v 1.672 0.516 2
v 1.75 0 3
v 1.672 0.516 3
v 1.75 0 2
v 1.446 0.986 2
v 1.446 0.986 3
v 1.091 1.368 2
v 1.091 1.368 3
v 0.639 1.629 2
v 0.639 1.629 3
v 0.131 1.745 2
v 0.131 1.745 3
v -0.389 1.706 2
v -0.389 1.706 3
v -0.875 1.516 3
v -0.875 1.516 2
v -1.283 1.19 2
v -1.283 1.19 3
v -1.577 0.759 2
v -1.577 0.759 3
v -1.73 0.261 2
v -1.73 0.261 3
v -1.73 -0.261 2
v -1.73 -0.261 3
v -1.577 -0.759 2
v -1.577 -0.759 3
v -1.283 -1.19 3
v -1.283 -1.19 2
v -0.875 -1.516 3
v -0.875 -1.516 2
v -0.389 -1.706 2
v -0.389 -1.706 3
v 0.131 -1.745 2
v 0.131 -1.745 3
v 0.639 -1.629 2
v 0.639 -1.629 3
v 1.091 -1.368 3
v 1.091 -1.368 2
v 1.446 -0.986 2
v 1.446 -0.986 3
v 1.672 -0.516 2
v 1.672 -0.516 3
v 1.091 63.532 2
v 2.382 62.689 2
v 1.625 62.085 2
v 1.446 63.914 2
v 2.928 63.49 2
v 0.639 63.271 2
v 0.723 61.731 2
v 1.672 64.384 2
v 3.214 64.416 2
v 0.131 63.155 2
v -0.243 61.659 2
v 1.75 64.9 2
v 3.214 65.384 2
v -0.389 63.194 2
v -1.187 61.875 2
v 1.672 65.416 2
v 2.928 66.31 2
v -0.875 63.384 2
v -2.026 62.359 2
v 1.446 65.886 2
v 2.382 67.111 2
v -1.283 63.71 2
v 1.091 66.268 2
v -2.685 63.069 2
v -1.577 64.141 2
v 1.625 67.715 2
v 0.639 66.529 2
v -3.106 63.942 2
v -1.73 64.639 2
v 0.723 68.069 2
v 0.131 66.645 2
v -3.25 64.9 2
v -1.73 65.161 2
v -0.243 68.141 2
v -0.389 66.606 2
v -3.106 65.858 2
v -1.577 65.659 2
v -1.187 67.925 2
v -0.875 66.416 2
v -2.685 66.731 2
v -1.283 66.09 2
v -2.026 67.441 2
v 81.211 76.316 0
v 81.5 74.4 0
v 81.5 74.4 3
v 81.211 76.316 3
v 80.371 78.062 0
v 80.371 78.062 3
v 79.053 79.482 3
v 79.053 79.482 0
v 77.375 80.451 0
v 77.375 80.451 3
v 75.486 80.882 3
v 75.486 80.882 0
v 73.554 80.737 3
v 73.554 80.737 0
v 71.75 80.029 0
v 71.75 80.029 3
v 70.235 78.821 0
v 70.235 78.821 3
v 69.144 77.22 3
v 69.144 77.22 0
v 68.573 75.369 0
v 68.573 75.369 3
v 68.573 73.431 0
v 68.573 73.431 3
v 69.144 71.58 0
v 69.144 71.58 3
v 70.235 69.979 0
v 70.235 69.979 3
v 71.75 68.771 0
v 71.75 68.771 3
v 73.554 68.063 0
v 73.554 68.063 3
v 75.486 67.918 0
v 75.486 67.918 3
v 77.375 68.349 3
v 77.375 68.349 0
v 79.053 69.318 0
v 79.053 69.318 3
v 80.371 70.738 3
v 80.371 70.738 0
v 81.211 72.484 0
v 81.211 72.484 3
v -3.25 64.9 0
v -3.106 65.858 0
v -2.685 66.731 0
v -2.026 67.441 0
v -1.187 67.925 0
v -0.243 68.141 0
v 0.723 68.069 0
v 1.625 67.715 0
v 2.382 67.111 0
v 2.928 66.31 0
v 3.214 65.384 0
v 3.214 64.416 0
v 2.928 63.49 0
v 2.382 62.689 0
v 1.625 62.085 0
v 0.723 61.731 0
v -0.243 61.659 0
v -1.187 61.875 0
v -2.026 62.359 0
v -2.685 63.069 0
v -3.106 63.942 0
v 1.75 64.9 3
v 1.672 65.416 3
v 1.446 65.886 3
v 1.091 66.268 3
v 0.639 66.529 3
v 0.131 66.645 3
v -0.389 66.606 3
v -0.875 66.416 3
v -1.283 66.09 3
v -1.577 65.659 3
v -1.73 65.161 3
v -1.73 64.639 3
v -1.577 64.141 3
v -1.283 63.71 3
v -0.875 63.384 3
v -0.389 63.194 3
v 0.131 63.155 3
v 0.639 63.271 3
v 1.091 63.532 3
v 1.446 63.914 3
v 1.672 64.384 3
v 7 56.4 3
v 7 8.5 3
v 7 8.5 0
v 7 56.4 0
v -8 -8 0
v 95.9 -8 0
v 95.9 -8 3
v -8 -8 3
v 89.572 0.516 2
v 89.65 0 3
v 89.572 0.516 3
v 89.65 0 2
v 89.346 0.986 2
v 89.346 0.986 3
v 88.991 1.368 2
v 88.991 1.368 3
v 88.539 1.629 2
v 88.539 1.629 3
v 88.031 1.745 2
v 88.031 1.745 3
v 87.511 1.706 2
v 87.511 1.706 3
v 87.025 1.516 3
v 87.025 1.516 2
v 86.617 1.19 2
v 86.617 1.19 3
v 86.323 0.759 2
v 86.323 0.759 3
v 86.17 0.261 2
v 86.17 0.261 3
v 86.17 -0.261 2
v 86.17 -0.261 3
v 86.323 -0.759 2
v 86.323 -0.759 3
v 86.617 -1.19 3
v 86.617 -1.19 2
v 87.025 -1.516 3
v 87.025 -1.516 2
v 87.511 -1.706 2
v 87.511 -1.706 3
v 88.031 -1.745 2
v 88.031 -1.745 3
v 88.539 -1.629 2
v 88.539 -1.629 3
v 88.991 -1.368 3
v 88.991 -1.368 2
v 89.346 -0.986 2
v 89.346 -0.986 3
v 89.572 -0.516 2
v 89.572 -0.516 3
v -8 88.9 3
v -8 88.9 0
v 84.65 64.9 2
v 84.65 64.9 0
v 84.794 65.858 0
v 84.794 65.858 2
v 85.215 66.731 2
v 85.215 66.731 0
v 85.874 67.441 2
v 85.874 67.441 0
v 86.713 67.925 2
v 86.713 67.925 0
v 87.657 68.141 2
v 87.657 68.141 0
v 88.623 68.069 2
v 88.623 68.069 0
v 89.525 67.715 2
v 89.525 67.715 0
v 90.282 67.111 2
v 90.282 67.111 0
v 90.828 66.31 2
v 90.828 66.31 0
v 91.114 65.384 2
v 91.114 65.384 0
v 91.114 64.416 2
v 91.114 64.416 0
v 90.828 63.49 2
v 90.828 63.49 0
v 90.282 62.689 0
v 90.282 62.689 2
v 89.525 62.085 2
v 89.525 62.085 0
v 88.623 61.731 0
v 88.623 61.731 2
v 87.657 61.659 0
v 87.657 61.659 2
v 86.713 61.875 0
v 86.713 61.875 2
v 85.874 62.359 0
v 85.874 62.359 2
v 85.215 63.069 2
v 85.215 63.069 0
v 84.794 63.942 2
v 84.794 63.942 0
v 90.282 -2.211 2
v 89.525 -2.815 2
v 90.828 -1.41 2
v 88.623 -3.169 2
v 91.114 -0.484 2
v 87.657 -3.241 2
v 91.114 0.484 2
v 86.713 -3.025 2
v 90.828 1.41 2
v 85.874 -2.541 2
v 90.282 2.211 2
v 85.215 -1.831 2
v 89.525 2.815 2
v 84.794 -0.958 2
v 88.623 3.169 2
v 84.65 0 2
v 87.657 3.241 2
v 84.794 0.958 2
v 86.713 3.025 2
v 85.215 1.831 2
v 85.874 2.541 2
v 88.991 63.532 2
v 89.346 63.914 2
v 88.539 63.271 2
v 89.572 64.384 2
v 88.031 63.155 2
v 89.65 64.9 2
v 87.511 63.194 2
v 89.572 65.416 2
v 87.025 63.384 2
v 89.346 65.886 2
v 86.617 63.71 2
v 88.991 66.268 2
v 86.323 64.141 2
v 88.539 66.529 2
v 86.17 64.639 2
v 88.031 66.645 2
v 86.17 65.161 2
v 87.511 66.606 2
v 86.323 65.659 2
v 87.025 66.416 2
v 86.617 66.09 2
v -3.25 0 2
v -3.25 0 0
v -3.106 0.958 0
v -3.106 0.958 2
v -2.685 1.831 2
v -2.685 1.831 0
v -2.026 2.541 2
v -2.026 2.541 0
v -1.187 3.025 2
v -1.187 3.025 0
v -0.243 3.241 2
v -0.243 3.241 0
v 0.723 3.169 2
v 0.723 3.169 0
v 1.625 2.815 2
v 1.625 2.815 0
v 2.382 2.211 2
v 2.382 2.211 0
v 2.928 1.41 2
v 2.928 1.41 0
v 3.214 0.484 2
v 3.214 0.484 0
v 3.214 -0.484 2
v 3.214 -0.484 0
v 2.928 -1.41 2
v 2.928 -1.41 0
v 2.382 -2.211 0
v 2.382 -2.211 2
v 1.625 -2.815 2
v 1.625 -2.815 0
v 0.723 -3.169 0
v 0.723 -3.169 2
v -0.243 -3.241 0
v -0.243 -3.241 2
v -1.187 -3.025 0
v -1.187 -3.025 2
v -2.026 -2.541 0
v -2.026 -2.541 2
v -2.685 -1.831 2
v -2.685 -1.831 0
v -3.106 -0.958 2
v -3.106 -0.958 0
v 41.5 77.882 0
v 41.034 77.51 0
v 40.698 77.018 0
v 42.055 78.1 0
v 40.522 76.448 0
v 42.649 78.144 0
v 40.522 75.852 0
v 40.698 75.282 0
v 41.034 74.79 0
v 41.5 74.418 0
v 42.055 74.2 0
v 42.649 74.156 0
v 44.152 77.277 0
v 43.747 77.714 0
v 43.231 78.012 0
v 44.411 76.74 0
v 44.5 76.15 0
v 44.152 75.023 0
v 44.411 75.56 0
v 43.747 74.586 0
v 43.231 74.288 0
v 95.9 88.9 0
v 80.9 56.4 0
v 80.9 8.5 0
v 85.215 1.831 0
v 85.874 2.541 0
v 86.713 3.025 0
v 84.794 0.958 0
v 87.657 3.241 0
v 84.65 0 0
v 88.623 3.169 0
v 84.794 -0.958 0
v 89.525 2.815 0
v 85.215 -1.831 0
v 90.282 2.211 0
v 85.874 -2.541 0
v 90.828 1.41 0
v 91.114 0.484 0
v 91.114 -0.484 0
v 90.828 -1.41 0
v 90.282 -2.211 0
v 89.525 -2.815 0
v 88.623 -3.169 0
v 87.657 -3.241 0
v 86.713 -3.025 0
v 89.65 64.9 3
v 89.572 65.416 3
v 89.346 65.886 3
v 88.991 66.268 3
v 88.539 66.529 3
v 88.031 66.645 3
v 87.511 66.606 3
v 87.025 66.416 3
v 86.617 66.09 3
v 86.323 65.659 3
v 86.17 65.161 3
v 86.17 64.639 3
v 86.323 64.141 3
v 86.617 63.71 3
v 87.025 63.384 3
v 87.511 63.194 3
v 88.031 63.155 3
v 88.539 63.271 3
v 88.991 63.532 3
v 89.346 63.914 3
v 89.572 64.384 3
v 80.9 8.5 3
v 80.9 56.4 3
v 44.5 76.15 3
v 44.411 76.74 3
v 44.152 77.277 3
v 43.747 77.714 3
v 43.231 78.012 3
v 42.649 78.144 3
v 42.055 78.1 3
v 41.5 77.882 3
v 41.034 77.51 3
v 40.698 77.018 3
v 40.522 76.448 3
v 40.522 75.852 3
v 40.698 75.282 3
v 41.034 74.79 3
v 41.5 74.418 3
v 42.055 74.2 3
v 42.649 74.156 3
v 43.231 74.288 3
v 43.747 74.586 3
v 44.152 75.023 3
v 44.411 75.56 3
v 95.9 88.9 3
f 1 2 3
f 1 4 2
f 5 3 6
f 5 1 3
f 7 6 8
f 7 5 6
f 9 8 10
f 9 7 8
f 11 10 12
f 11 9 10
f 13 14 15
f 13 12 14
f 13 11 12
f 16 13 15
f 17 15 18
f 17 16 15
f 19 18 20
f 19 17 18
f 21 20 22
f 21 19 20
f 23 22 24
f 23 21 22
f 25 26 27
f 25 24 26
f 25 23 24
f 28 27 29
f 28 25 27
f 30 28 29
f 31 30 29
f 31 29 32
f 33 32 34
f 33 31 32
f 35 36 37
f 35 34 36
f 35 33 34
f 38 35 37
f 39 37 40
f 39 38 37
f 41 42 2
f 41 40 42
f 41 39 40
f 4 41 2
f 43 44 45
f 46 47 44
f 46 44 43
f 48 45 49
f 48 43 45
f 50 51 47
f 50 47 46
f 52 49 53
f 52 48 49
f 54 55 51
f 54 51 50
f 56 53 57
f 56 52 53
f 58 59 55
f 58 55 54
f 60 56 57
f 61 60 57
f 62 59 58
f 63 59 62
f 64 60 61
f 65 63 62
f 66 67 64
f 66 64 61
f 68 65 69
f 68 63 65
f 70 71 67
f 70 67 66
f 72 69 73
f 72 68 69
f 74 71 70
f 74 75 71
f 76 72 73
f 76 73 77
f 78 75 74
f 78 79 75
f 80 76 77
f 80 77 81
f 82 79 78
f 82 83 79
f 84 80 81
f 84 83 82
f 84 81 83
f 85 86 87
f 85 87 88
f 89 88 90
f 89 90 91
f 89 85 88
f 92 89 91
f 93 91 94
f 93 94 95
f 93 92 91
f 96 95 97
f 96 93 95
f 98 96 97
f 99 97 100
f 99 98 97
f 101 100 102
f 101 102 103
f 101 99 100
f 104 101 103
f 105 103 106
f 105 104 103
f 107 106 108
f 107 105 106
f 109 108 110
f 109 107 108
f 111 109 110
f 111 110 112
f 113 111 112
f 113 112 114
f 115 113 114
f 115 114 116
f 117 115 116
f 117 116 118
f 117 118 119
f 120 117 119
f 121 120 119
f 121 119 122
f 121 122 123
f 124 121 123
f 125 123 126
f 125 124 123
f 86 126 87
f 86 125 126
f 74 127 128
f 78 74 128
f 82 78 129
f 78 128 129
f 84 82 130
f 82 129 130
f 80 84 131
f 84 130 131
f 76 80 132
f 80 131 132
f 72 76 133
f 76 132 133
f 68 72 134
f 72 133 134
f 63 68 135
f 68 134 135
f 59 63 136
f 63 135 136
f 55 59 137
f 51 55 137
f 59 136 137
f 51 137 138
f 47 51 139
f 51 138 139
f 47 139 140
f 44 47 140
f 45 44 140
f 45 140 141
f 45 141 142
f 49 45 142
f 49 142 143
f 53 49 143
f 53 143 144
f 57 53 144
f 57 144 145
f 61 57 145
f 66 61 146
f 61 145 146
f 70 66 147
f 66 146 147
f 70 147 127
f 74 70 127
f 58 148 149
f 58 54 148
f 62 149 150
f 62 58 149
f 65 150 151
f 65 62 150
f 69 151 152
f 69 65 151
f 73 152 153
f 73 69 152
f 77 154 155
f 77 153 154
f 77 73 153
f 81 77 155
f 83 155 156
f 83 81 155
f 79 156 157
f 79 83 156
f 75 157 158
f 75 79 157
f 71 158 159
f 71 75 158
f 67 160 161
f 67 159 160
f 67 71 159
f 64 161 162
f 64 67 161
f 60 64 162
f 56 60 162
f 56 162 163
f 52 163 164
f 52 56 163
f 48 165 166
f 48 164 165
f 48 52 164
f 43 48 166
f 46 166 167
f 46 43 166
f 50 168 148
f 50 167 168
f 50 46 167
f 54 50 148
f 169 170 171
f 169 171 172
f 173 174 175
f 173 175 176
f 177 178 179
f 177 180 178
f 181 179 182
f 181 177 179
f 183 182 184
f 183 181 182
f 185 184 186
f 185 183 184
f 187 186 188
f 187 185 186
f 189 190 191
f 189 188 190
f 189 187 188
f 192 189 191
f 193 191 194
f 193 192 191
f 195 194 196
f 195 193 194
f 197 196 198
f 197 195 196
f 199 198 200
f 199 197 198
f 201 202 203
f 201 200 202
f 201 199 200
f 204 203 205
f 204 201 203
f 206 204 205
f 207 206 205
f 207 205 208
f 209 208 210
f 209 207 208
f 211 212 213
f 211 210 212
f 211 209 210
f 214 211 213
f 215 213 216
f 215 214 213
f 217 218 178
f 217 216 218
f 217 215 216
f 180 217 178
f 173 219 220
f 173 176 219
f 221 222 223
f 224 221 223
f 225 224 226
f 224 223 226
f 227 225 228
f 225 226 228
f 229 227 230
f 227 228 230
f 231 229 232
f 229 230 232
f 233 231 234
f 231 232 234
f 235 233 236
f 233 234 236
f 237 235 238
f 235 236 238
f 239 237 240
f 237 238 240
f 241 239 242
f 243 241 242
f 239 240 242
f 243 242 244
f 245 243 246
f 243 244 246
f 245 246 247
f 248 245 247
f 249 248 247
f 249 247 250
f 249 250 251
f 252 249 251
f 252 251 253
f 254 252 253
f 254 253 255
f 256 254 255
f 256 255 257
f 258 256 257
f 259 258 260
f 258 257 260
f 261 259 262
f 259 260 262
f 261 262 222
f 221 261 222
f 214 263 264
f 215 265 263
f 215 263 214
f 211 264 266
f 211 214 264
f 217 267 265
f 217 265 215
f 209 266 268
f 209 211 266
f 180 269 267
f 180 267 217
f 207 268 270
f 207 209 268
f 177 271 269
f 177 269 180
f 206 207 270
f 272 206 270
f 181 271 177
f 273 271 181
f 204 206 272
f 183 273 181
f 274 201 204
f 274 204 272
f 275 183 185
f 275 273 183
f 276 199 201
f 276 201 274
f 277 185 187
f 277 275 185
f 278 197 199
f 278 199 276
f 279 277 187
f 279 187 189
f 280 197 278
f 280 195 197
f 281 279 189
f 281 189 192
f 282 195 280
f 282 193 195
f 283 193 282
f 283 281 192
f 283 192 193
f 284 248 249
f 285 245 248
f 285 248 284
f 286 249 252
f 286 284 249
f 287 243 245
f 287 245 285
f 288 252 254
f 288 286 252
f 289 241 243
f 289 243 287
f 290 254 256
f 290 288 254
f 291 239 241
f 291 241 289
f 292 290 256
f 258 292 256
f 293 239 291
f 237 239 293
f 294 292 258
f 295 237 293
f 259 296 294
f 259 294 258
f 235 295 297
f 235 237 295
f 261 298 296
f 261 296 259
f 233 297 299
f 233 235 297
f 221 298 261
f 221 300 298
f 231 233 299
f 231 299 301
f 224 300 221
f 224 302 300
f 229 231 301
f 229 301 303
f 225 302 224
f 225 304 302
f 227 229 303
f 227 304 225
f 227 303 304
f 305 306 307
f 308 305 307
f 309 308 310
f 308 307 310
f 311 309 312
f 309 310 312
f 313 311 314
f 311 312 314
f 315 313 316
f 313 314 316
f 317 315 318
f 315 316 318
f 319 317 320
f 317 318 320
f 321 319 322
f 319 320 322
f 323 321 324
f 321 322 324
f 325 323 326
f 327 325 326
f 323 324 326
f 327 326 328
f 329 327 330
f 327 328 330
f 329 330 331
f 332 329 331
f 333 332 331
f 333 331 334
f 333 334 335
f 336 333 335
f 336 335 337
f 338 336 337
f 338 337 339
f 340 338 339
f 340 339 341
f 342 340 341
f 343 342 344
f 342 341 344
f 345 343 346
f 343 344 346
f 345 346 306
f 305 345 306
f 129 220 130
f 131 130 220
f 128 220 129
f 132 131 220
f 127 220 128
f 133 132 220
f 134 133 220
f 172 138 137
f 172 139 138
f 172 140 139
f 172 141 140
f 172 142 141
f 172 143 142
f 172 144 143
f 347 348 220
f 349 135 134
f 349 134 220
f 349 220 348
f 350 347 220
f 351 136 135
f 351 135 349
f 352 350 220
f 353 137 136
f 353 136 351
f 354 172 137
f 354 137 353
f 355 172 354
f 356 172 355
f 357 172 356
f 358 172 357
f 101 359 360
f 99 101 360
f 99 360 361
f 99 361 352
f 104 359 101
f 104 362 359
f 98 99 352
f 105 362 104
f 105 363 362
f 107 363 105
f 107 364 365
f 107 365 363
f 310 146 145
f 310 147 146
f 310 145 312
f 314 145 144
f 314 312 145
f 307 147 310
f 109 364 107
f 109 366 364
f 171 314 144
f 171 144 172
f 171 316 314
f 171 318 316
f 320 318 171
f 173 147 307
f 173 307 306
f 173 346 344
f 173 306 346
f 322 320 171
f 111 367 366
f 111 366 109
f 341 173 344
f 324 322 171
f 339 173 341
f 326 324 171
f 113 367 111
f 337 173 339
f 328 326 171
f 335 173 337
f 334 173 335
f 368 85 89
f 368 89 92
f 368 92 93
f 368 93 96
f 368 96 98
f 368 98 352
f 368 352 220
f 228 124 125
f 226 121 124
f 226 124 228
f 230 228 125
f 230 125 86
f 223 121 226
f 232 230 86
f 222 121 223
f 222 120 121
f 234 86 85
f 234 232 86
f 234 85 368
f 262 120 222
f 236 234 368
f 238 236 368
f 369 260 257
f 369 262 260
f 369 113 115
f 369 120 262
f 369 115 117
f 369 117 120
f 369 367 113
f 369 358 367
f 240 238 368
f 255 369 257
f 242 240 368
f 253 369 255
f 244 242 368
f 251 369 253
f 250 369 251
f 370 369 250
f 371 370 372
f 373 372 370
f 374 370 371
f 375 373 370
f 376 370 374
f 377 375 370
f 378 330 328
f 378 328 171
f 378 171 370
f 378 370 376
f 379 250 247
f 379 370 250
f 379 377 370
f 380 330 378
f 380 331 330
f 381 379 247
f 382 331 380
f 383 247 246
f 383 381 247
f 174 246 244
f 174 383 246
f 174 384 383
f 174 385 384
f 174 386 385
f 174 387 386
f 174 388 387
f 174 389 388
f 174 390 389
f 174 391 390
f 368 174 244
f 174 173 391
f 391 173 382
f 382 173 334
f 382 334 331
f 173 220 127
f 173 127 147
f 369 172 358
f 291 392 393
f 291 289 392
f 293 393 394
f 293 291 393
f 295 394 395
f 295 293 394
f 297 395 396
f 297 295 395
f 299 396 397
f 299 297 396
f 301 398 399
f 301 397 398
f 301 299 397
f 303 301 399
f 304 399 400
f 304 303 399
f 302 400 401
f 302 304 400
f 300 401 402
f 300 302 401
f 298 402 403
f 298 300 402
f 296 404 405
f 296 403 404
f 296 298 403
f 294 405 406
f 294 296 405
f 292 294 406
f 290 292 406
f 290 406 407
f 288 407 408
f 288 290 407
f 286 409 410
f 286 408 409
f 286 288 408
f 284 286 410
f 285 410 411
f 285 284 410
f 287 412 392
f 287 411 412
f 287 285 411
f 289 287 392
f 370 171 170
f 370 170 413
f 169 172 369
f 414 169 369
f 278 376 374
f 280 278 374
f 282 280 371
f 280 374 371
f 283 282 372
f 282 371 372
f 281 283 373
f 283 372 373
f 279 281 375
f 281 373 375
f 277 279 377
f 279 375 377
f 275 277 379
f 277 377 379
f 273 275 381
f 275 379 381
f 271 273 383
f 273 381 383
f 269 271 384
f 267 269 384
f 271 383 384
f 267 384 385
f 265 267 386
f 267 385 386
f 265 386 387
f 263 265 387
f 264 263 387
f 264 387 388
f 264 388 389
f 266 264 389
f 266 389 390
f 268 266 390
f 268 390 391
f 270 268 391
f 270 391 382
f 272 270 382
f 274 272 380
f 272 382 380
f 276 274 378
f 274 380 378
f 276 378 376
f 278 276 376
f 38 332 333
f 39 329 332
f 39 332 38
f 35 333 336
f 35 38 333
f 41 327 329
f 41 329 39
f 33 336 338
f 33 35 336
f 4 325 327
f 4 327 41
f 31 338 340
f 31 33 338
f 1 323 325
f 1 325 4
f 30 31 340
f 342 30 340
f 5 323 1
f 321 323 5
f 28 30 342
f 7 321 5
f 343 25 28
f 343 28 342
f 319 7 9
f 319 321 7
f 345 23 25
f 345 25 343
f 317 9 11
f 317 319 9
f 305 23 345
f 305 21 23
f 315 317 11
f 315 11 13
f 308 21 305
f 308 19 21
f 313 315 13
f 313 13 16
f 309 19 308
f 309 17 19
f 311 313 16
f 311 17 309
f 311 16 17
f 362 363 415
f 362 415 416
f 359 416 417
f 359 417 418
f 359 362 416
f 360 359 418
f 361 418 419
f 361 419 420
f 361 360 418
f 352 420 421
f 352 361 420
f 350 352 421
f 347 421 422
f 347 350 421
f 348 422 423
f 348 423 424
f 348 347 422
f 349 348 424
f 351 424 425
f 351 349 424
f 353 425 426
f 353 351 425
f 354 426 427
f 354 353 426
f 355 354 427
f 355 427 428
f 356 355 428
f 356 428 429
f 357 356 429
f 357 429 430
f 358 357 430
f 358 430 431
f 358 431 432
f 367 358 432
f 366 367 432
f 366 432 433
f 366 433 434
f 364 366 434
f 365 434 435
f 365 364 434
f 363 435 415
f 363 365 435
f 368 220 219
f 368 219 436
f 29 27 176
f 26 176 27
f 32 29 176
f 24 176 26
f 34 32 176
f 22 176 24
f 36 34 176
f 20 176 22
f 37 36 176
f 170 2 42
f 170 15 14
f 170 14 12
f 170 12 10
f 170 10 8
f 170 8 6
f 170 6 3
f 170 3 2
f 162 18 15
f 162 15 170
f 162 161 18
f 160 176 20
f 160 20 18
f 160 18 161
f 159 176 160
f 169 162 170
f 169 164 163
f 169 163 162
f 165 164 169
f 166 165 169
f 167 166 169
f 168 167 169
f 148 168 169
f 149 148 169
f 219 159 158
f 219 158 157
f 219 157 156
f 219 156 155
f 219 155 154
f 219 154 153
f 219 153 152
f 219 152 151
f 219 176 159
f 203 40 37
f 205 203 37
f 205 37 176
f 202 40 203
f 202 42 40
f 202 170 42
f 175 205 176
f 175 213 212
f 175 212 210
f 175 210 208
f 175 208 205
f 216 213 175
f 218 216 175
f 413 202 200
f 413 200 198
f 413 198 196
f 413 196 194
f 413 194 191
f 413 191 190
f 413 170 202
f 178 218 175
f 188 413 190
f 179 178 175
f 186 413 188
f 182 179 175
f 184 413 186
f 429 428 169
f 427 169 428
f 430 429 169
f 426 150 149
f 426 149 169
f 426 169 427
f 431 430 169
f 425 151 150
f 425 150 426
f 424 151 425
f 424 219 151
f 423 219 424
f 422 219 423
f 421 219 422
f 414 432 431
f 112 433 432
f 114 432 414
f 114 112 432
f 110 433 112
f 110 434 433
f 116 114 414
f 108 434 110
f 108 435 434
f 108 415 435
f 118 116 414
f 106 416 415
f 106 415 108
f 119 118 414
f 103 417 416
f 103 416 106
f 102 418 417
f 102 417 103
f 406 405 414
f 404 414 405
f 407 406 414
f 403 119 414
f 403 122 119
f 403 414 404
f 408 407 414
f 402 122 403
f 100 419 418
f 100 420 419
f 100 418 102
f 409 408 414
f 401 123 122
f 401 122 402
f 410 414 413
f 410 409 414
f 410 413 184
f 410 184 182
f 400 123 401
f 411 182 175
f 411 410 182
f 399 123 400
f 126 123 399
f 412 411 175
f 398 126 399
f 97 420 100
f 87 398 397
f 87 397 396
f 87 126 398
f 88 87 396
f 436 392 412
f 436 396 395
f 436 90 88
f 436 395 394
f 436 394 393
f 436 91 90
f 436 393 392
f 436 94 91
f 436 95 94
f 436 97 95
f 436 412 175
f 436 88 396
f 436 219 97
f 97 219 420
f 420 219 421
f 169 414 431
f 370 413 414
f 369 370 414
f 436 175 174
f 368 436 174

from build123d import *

# Parameters (mm, degrees)
SKETCH1_R           = 1.75
SKETCH1_R_2         = 6.5
SKETCH1_R_3         = 2
SKETCH1_W           = 77.9
SKETCH1_H           = 47.9
BOSS_EXTRUDE1_DEPTH = 3
SKETCH2_W           = 2
SKETCH2_H           = 47.9
BOSS_EXTRUDE2_DEPTH = 3
SKETCH4_W           = 15
SKETCH4_H           = 92.738679811
BOSS_EXTRUDE4_DEPTH = 3
SKETCH5_W           = 15
SKETCH5_H           = 92.013865939
BOSS_EXTRUDE5_DEPTH = 3
SKETCH7_W           = 103.9
SKETCH7_H           = 15
BOSS_EXTRUDE6_DEPTH = 3
SKETCH9_R           = 3.25
CUT_EXTRUDE1_DEPTH  = 2
SKETCH10_W          = 103.9
SKETCH10_H          = 15
BOSS_EXTRUDE8_DEPTH = 3
SKETCH12_R          = 3.75
SKETCH12_R_2        = 1.75
BOSS_EXTRUDE9_DEPTH = 8
SKETCH13_W          = 3
SKETCH13_H          = 23
CUT_EXTRUDE2_DEPTH  = 8
SKETCH14_W          = 281.555590783
SKETCH14_H          = 173.736843818
CUT_EXTRUDE3_DEPTH  = 12


with BuildPart() as part:
    # Sketch1 → Boss-Extrude1 (new body)
    with BuildSketch(Plane.XY):
        Polygon((-5, -5), (-5, 69.9), (-5, 85.9), (92.9, 85.9), (92.9, 69.9), (92.9, -5), align=None)
        with Locations((0, 64.9)):
            Circle(SKETCH1_R, mode=Mode.SUBTRACT)
        with Locations((87.9, 64.9)):
            Circle(SKETCH1_R, mode=Mode.SUBTRACT)
        with Locations((87.9, 0)):
            Circle(SKETCH1_R, mode=Mode.SUBTRACT)
        Circle(SKETCH1_R, mode=Mode.SUBTRACT)
        with Locations((75, 74.4)):
            Circle(SKETCH1_R_2, mode=Mode.SUBTRACT)
        with Locations((42.5, 76.15)):
            Circle(SKETCH1_R_3, mode=Mode.SUBTRACT)
        with Locations((43.95, 32.45)):
            Rectangle(SKETCH1_W, SKETCH1_H, mode=Mode.SUBTRACT)
    extrude(amount=BOSS_EXTRUDE1_DEPTH)

    # Sketch2 → Boss-Extrude2 (add)
    with BuildSketch(Plane.XY.offset(3)):
        with Locations((81.9, 32.45)):
            Rectangle(SKETCH2_W, SKETCH2_H)
        with Locations((6, 32.45)):
            Rectangle(SKETCH2_W, SKETCH2_H)
    extrude(amount=-BOSS_EXTRUDE2_DEPTH)

    # Sketch4 → Boss-Extrude4 (add)
    with BuildSketch(Plane(origin=(92.9, 0, 0), x_dir=(0, 0, -1), z_dir=(1, 0, 0))):
        with Locations((-7.5, 41.369339906)):
            Rectangle(SKETCH4_W, SKETCH4_H)
    extrude(amount=BOSS_EXTRUDE4_DEPTH)

    # Sketch5 → Boss-Extrude5 (add)
    with BuildSketch(Plane.ZY.offset(5)):
        with Locations((7.5, 41.006932969)):
            Rectangle(SKETCH5_W, SKETCH5_H)
    extrude(amount=BOSS_EXTRUDE5_DEPTH)

    # Sketch7 → Boss-Extrude6 (add)
    with BuildSketch(Plane(origin=(0, -5, 0), x_dir=(-1, 0, 0), z_dir=(0, -1, 0))):
        with Locations((-43.95, -7.5)):
            Rectangle(SKETCH7_W, SKETCH7_H)
    extrude(amount=BOSS_EXTRUDE6_DEPTH)

    # Sketch9 → Cut-Extrude1 (cut)
    with BuildSketch(Plane(origin=(0, 0, 0), x_dir=(-1, 0, 0), z_dir=(0, 0, -1))):
        Circle(SKETCH9_R)
        with Locations((-87.9, 0)):
            Circle(SKETCH9_R)
        with Locations((-87.9, 64.9)):
            Circle(SKETCH9_R)
        with Locations((0, 64.9)):
            Circle(SKETCH9_R)
    extrude(amount=-CUT_EXTRUDE1_DEPTH, mode=Mode.SUBTRACT)

    # Sketch10 → Boss-Extrude8 (add)
    with BuildSketch(Plane(origin=(0, 85.9, 0), x_dir=(1, 0, 0), z_dir=(0, 1, 0))):
        with Locations((43.95, -7.5)):
            Rectangle(SKETCH10_W, SKETCH10_H)
    extrude(amount=BOSS_EXTRUDE8_DEPTH)

    # Sketch12 → Boss-Extrude9 (add)
    with BuildSketch(Plane.XY.offset(3)):
        with Locations((0, 64.9)):
            Circle(SKETCH12_R)
        with Locations((0, 64.9)):
            Circle(SKETCH12_R_2, mode=Mode.SUBTRACT)
        Circle(SKETCH12_R)
        Circle(SKETCH12_R_2, mode=Mode.SUBTRACT)
        with Locations((87.9, 64.9)):
            Circle(SKETCH12_R)
        with Locations((87.9, 64.9)):
            Circle(SKETCH12_R_2, mode=Mode.SUBTRACT)
        with Locations((87.9, 0)):
            Circle(SKETCH12_R)
        with Locations((87.9, 0)):
            Circle(SKETCH12_R_2, mode=Mode.SUBTRACT)
    extrude(amount=BOSS_EXTRUDE9_DEPTH)

    # Sketch13 → Cut-Extrude2 (cut)
    with BuildSketch(Plane(origin=(95.9, 0, 0), x_dir=(0, 0, -1), z_dir=(1, 0, 0))):
        with Locations((-13.5, 53.54685285)):
            Rectangle(SKETCH13_W, SKETCH13_H)
    extrude(amount=-CUT_EXTRUDE2_DEPTH, mode=Mode.SUBTRACT)

    # Sketch14 → Cut-Extrude3 (cut)
    with BuildSketch(Plane.XY.offset(15)):
        with Locations((95.022411609, 36.684941712)):
            Rectangle(SKETCH14_W, SKETCH14_H)
    extrude(amount=-CUT_EXTRUDE3_DEPTH, mode=Mode.SUBTRACT)


solid = part.part
